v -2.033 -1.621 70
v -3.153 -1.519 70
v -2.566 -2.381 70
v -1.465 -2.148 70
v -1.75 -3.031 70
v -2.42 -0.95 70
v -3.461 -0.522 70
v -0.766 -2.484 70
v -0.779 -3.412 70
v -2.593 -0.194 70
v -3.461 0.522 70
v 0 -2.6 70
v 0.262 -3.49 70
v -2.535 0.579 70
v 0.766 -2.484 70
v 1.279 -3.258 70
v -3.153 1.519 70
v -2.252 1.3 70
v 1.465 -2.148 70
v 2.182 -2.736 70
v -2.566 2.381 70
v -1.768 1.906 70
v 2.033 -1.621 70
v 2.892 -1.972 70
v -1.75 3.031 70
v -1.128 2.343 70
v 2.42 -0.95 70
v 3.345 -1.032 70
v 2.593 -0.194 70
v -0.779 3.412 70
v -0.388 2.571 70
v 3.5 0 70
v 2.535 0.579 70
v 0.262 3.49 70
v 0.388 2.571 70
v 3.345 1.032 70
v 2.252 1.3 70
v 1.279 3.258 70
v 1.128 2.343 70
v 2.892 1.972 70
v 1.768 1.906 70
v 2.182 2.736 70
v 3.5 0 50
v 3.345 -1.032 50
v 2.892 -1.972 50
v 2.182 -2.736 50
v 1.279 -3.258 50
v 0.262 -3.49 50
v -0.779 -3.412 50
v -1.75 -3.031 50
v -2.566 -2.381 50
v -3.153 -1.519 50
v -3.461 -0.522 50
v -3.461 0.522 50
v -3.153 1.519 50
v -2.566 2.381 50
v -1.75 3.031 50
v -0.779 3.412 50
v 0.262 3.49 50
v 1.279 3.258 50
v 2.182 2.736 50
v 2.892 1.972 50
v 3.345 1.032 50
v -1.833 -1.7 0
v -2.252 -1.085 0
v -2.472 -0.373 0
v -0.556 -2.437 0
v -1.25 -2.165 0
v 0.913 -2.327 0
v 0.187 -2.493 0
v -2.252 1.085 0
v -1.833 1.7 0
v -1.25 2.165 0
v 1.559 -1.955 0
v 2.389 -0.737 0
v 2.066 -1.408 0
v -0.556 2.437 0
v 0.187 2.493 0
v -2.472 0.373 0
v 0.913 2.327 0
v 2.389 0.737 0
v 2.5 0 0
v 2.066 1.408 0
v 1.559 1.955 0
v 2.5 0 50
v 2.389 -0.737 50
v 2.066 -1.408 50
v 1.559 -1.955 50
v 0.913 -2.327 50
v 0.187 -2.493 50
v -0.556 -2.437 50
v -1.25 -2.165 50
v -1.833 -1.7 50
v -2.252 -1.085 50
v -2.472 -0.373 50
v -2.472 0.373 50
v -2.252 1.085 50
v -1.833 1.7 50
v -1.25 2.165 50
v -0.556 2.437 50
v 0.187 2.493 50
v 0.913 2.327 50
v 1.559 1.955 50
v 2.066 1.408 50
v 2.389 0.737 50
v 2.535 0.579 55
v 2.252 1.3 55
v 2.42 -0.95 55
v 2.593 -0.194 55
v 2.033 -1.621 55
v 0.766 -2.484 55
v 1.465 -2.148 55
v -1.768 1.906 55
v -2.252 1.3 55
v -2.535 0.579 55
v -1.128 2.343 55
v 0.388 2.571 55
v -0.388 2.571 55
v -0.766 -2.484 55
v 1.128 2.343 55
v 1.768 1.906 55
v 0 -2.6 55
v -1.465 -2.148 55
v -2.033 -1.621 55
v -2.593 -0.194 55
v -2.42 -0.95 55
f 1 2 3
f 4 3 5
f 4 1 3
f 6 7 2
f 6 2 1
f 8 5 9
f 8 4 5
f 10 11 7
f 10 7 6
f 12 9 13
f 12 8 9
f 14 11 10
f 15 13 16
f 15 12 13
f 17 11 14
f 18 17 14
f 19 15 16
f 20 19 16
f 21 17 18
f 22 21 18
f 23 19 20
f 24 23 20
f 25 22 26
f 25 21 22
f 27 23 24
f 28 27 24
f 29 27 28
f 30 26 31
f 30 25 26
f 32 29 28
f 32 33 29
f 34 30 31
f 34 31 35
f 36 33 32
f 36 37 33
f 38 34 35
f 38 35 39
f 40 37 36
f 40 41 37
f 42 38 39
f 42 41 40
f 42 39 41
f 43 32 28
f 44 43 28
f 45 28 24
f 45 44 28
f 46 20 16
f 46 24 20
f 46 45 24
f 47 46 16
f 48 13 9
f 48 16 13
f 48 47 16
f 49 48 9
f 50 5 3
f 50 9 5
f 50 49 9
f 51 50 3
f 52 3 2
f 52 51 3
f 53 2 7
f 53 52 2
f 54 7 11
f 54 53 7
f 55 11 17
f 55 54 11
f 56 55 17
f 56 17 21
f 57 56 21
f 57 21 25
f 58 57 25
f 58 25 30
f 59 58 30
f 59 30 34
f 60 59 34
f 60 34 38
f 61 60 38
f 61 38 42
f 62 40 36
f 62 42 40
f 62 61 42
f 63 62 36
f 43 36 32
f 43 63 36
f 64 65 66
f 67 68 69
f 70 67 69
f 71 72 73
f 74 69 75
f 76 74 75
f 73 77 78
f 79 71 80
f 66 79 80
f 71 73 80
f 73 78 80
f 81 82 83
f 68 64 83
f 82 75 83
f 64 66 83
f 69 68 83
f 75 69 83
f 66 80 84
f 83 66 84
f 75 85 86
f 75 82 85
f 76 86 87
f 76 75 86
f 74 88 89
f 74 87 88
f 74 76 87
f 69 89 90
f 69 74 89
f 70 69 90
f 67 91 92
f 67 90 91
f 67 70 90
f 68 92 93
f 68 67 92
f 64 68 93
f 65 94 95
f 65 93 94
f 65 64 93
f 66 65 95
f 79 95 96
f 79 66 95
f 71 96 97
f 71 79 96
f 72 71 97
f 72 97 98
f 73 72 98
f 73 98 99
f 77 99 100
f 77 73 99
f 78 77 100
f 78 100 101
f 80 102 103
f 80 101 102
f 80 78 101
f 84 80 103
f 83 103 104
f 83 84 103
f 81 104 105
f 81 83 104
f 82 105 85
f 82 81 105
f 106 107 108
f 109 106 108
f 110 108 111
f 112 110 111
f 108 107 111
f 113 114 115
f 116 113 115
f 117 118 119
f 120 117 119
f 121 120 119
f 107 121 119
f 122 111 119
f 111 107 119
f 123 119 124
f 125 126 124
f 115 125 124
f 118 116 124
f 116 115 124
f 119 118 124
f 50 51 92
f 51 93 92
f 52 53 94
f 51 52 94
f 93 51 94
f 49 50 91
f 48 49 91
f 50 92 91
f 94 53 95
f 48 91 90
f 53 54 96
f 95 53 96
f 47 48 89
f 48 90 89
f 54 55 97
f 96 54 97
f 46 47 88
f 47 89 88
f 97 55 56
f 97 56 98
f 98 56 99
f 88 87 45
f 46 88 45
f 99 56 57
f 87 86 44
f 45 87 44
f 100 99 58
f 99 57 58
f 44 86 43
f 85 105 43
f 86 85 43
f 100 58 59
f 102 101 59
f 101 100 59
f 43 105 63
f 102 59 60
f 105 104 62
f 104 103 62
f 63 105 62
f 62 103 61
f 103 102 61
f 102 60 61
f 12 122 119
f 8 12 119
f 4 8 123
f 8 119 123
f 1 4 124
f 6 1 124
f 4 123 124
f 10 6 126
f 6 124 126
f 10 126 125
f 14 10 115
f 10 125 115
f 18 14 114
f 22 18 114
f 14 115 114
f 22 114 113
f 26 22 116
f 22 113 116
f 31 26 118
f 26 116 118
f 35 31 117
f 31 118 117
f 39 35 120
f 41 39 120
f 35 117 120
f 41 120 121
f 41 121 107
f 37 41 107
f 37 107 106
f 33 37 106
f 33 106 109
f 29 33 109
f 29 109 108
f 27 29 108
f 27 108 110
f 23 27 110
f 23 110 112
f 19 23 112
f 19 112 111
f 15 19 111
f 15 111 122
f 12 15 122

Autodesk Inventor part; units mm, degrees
ref_plane "YZ Plane" through (0, 0, 0) normal (1, 0, 0) x (0, 1, 0)
ref_plane "XZ Plane" through (0, 0, 0) normal (0, 1, 0) x (-1, 0, 0)
ref_plane "XY Plane" through (0, 0, 0) normal (0, 0, 1) x (1, 0, 0)
sketch "Sketch1" plane through (0, 0, 0) normal (0, 0, 1) x (1, 0, 0)
  circle A0 centre (0, 0) radius 2.5
  dimension "d0" = 5
extrude "Extrusion1" add sketch "Sketch1" along normal blind 50
sketch "Sketch2" plane through (0, 0, 50) normal (0, 0, 1) x (1, 0, 0)
  circle A0 centre (0, 0) radius 3.5
  dimension "d3" = 7
extrude "Extrusion2" add sketch "Sketch2" along normal blind 20
sketch "Sketch3" plane through (0, 0, 70) normal (0, 0, 1) x (1, 0, 0)
  point P0 (0, 0)
  point P1 (0, 0)
hole "Hole1" at (0, 0, 70) direction (0, 0, -1) diameter 5.2 depth 15
equation "\"fitTol\" = 0.2"
properties part number "RCPlaneConnectorTest2"
